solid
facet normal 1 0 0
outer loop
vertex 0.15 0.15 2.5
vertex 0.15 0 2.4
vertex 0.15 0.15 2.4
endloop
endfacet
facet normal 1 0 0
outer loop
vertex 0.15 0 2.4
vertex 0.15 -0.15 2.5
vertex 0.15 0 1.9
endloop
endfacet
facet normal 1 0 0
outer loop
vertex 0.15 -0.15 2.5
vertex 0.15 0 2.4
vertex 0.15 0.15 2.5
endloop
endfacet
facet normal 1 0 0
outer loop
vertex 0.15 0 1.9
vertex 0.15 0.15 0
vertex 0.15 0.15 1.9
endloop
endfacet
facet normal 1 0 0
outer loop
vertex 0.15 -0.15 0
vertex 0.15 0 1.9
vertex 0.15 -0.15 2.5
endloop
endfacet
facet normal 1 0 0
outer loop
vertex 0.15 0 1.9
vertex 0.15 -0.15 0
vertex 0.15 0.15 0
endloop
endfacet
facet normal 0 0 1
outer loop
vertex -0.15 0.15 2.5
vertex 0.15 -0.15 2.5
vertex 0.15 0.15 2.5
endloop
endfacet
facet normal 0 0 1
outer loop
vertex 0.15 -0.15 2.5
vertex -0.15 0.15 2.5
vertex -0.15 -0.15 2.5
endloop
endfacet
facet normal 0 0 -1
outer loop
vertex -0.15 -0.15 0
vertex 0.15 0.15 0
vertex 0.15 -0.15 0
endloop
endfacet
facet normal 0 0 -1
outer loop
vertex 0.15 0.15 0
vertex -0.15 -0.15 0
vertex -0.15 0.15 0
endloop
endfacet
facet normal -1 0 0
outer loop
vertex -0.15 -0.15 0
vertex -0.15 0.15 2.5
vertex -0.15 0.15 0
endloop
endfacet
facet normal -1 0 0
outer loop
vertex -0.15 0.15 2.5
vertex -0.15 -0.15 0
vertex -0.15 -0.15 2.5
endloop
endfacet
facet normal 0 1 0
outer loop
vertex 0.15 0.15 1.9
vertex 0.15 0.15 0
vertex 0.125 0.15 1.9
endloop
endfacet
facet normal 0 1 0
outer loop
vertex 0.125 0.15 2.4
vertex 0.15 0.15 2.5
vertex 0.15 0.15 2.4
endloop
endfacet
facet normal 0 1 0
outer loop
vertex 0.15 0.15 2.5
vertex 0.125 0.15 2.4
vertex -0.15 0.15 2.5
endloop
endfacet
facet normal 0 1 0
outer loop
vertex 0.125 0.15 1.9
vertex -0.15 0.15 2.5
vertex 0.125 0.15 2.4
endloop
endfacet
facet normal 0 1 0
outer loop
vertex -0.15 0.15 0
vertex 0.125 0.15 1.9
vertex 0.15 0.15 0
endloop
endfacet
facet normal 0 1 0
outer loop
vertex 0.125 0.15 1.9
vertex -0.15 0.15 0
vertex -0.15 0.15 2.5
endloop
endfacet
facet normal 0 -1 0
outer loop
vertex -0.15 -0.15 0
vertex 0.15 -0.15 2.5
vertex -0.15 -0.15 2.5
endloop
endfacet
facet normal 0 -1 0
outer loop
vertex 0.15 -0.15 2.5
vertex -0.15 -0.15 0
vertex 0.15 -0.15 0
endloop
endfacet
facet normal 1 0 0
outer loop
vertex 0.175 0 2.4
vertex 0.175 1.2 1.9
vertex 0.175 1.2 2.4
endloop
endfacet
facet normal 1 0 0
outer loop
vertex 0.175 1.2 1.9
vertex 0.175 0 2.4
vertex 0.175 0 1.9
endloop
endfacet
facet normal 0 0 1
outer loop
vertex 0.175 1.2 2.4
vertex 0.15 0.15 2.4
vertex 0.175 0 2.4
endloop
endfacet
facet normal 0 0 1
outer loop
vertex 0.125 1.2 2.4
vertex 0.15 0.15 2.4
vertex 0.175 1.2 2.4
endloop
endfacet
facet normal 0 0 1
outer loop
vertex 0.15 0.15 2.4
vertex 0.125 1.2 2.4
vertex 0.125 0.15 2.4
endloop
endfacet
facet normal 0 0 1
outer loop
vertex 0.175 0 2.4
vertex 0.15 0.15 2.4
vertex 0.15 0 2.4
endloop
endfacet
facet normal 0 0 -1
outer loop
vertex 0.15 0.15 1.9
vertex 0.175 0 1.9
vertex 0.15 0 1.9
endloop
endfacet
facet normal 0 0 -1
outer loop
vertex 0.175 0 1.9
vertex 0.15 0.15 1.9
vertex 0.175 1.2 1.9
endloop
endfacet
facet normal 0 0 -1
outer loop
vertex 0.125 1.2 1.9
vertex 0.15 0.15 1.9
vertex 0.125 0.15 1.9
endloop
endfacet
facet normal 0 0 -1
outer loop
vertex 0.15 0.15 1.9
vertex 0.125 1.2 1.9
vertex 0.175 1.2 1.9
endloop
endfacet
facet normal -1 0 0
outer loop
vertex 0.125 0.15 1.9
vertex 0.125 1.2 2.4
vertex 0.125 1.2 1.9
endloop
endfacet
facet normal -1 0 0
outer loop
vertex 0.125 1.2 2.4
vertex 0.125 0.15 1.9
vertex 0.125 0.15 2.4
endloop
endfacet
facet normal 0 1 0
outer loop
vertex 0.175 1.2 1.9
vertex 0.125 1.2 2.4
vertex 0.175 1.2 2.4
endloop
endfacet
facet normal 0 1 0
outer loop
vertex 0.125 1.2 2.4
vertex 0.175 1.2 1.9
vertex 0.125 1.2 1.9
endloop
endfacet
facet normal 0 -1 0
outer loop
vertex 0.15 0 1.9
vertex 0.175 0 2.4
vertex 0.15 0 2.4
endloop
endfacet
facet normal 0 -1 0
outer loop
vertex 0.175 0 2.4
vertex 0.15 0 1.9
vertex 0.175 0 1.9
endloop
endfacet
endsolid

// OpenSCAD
// Road edge-connection marker — a yellow post with a small flag, placed
// by the scenario editor to mark where roads meet the map perimeter (cars
// spawn / despawn here at runtime). Visible in both editor and scenario
// so designers can see them while authoring and players can read where
// the world "ends" for the road network.
//
// Tall enough to read against the road at the standard zoomed-out camera
// distance; thin enough not to dominate the scene visually. Black post +
// yellow flag echo real-world boundary-marker semantics.
//
// Conventions, units, and axis docs: see models-src/README.md.

$fn = 12;

// ── Dimensions (metres) ────────────────────────────────────────────────
post_w = 0.30;   // square section
post_h = 2.50;

flag_thick = 0.05; // along the post's X face
flag_len   = 1.20; // length the flag extends along +Y
flag_h     = 0.50;
flag_z0    = post_h - flag_h - 0.10; // top of flag a touch below post tip

// ── Geometry ───────────────────────────────────────────────────────────
// Post rises from the origin in +Z. Origin is the centre of the ground
// footprint on Z = 0.
module post() {
    color("Black")
        translate([0, 0, post_h / 2])
            cube([post_w, post_w, post_h], center = true);
}

// Flag hinges off the +X face of the post and extends in +Y. The high
// visibility comes from the colour, not the size — the flag stays small
// so the marker reads as "infrastructure", not "monument".
module flag() {
    color("Yellow")
        translate([post_w / 2, flag_len / 2, flag_z0 + flag_h / 2])
            cube([flag_thick, flag_len, flag_h], center = true);
}

module road_connect() {
    post();
    flag();
}

road_connect();
